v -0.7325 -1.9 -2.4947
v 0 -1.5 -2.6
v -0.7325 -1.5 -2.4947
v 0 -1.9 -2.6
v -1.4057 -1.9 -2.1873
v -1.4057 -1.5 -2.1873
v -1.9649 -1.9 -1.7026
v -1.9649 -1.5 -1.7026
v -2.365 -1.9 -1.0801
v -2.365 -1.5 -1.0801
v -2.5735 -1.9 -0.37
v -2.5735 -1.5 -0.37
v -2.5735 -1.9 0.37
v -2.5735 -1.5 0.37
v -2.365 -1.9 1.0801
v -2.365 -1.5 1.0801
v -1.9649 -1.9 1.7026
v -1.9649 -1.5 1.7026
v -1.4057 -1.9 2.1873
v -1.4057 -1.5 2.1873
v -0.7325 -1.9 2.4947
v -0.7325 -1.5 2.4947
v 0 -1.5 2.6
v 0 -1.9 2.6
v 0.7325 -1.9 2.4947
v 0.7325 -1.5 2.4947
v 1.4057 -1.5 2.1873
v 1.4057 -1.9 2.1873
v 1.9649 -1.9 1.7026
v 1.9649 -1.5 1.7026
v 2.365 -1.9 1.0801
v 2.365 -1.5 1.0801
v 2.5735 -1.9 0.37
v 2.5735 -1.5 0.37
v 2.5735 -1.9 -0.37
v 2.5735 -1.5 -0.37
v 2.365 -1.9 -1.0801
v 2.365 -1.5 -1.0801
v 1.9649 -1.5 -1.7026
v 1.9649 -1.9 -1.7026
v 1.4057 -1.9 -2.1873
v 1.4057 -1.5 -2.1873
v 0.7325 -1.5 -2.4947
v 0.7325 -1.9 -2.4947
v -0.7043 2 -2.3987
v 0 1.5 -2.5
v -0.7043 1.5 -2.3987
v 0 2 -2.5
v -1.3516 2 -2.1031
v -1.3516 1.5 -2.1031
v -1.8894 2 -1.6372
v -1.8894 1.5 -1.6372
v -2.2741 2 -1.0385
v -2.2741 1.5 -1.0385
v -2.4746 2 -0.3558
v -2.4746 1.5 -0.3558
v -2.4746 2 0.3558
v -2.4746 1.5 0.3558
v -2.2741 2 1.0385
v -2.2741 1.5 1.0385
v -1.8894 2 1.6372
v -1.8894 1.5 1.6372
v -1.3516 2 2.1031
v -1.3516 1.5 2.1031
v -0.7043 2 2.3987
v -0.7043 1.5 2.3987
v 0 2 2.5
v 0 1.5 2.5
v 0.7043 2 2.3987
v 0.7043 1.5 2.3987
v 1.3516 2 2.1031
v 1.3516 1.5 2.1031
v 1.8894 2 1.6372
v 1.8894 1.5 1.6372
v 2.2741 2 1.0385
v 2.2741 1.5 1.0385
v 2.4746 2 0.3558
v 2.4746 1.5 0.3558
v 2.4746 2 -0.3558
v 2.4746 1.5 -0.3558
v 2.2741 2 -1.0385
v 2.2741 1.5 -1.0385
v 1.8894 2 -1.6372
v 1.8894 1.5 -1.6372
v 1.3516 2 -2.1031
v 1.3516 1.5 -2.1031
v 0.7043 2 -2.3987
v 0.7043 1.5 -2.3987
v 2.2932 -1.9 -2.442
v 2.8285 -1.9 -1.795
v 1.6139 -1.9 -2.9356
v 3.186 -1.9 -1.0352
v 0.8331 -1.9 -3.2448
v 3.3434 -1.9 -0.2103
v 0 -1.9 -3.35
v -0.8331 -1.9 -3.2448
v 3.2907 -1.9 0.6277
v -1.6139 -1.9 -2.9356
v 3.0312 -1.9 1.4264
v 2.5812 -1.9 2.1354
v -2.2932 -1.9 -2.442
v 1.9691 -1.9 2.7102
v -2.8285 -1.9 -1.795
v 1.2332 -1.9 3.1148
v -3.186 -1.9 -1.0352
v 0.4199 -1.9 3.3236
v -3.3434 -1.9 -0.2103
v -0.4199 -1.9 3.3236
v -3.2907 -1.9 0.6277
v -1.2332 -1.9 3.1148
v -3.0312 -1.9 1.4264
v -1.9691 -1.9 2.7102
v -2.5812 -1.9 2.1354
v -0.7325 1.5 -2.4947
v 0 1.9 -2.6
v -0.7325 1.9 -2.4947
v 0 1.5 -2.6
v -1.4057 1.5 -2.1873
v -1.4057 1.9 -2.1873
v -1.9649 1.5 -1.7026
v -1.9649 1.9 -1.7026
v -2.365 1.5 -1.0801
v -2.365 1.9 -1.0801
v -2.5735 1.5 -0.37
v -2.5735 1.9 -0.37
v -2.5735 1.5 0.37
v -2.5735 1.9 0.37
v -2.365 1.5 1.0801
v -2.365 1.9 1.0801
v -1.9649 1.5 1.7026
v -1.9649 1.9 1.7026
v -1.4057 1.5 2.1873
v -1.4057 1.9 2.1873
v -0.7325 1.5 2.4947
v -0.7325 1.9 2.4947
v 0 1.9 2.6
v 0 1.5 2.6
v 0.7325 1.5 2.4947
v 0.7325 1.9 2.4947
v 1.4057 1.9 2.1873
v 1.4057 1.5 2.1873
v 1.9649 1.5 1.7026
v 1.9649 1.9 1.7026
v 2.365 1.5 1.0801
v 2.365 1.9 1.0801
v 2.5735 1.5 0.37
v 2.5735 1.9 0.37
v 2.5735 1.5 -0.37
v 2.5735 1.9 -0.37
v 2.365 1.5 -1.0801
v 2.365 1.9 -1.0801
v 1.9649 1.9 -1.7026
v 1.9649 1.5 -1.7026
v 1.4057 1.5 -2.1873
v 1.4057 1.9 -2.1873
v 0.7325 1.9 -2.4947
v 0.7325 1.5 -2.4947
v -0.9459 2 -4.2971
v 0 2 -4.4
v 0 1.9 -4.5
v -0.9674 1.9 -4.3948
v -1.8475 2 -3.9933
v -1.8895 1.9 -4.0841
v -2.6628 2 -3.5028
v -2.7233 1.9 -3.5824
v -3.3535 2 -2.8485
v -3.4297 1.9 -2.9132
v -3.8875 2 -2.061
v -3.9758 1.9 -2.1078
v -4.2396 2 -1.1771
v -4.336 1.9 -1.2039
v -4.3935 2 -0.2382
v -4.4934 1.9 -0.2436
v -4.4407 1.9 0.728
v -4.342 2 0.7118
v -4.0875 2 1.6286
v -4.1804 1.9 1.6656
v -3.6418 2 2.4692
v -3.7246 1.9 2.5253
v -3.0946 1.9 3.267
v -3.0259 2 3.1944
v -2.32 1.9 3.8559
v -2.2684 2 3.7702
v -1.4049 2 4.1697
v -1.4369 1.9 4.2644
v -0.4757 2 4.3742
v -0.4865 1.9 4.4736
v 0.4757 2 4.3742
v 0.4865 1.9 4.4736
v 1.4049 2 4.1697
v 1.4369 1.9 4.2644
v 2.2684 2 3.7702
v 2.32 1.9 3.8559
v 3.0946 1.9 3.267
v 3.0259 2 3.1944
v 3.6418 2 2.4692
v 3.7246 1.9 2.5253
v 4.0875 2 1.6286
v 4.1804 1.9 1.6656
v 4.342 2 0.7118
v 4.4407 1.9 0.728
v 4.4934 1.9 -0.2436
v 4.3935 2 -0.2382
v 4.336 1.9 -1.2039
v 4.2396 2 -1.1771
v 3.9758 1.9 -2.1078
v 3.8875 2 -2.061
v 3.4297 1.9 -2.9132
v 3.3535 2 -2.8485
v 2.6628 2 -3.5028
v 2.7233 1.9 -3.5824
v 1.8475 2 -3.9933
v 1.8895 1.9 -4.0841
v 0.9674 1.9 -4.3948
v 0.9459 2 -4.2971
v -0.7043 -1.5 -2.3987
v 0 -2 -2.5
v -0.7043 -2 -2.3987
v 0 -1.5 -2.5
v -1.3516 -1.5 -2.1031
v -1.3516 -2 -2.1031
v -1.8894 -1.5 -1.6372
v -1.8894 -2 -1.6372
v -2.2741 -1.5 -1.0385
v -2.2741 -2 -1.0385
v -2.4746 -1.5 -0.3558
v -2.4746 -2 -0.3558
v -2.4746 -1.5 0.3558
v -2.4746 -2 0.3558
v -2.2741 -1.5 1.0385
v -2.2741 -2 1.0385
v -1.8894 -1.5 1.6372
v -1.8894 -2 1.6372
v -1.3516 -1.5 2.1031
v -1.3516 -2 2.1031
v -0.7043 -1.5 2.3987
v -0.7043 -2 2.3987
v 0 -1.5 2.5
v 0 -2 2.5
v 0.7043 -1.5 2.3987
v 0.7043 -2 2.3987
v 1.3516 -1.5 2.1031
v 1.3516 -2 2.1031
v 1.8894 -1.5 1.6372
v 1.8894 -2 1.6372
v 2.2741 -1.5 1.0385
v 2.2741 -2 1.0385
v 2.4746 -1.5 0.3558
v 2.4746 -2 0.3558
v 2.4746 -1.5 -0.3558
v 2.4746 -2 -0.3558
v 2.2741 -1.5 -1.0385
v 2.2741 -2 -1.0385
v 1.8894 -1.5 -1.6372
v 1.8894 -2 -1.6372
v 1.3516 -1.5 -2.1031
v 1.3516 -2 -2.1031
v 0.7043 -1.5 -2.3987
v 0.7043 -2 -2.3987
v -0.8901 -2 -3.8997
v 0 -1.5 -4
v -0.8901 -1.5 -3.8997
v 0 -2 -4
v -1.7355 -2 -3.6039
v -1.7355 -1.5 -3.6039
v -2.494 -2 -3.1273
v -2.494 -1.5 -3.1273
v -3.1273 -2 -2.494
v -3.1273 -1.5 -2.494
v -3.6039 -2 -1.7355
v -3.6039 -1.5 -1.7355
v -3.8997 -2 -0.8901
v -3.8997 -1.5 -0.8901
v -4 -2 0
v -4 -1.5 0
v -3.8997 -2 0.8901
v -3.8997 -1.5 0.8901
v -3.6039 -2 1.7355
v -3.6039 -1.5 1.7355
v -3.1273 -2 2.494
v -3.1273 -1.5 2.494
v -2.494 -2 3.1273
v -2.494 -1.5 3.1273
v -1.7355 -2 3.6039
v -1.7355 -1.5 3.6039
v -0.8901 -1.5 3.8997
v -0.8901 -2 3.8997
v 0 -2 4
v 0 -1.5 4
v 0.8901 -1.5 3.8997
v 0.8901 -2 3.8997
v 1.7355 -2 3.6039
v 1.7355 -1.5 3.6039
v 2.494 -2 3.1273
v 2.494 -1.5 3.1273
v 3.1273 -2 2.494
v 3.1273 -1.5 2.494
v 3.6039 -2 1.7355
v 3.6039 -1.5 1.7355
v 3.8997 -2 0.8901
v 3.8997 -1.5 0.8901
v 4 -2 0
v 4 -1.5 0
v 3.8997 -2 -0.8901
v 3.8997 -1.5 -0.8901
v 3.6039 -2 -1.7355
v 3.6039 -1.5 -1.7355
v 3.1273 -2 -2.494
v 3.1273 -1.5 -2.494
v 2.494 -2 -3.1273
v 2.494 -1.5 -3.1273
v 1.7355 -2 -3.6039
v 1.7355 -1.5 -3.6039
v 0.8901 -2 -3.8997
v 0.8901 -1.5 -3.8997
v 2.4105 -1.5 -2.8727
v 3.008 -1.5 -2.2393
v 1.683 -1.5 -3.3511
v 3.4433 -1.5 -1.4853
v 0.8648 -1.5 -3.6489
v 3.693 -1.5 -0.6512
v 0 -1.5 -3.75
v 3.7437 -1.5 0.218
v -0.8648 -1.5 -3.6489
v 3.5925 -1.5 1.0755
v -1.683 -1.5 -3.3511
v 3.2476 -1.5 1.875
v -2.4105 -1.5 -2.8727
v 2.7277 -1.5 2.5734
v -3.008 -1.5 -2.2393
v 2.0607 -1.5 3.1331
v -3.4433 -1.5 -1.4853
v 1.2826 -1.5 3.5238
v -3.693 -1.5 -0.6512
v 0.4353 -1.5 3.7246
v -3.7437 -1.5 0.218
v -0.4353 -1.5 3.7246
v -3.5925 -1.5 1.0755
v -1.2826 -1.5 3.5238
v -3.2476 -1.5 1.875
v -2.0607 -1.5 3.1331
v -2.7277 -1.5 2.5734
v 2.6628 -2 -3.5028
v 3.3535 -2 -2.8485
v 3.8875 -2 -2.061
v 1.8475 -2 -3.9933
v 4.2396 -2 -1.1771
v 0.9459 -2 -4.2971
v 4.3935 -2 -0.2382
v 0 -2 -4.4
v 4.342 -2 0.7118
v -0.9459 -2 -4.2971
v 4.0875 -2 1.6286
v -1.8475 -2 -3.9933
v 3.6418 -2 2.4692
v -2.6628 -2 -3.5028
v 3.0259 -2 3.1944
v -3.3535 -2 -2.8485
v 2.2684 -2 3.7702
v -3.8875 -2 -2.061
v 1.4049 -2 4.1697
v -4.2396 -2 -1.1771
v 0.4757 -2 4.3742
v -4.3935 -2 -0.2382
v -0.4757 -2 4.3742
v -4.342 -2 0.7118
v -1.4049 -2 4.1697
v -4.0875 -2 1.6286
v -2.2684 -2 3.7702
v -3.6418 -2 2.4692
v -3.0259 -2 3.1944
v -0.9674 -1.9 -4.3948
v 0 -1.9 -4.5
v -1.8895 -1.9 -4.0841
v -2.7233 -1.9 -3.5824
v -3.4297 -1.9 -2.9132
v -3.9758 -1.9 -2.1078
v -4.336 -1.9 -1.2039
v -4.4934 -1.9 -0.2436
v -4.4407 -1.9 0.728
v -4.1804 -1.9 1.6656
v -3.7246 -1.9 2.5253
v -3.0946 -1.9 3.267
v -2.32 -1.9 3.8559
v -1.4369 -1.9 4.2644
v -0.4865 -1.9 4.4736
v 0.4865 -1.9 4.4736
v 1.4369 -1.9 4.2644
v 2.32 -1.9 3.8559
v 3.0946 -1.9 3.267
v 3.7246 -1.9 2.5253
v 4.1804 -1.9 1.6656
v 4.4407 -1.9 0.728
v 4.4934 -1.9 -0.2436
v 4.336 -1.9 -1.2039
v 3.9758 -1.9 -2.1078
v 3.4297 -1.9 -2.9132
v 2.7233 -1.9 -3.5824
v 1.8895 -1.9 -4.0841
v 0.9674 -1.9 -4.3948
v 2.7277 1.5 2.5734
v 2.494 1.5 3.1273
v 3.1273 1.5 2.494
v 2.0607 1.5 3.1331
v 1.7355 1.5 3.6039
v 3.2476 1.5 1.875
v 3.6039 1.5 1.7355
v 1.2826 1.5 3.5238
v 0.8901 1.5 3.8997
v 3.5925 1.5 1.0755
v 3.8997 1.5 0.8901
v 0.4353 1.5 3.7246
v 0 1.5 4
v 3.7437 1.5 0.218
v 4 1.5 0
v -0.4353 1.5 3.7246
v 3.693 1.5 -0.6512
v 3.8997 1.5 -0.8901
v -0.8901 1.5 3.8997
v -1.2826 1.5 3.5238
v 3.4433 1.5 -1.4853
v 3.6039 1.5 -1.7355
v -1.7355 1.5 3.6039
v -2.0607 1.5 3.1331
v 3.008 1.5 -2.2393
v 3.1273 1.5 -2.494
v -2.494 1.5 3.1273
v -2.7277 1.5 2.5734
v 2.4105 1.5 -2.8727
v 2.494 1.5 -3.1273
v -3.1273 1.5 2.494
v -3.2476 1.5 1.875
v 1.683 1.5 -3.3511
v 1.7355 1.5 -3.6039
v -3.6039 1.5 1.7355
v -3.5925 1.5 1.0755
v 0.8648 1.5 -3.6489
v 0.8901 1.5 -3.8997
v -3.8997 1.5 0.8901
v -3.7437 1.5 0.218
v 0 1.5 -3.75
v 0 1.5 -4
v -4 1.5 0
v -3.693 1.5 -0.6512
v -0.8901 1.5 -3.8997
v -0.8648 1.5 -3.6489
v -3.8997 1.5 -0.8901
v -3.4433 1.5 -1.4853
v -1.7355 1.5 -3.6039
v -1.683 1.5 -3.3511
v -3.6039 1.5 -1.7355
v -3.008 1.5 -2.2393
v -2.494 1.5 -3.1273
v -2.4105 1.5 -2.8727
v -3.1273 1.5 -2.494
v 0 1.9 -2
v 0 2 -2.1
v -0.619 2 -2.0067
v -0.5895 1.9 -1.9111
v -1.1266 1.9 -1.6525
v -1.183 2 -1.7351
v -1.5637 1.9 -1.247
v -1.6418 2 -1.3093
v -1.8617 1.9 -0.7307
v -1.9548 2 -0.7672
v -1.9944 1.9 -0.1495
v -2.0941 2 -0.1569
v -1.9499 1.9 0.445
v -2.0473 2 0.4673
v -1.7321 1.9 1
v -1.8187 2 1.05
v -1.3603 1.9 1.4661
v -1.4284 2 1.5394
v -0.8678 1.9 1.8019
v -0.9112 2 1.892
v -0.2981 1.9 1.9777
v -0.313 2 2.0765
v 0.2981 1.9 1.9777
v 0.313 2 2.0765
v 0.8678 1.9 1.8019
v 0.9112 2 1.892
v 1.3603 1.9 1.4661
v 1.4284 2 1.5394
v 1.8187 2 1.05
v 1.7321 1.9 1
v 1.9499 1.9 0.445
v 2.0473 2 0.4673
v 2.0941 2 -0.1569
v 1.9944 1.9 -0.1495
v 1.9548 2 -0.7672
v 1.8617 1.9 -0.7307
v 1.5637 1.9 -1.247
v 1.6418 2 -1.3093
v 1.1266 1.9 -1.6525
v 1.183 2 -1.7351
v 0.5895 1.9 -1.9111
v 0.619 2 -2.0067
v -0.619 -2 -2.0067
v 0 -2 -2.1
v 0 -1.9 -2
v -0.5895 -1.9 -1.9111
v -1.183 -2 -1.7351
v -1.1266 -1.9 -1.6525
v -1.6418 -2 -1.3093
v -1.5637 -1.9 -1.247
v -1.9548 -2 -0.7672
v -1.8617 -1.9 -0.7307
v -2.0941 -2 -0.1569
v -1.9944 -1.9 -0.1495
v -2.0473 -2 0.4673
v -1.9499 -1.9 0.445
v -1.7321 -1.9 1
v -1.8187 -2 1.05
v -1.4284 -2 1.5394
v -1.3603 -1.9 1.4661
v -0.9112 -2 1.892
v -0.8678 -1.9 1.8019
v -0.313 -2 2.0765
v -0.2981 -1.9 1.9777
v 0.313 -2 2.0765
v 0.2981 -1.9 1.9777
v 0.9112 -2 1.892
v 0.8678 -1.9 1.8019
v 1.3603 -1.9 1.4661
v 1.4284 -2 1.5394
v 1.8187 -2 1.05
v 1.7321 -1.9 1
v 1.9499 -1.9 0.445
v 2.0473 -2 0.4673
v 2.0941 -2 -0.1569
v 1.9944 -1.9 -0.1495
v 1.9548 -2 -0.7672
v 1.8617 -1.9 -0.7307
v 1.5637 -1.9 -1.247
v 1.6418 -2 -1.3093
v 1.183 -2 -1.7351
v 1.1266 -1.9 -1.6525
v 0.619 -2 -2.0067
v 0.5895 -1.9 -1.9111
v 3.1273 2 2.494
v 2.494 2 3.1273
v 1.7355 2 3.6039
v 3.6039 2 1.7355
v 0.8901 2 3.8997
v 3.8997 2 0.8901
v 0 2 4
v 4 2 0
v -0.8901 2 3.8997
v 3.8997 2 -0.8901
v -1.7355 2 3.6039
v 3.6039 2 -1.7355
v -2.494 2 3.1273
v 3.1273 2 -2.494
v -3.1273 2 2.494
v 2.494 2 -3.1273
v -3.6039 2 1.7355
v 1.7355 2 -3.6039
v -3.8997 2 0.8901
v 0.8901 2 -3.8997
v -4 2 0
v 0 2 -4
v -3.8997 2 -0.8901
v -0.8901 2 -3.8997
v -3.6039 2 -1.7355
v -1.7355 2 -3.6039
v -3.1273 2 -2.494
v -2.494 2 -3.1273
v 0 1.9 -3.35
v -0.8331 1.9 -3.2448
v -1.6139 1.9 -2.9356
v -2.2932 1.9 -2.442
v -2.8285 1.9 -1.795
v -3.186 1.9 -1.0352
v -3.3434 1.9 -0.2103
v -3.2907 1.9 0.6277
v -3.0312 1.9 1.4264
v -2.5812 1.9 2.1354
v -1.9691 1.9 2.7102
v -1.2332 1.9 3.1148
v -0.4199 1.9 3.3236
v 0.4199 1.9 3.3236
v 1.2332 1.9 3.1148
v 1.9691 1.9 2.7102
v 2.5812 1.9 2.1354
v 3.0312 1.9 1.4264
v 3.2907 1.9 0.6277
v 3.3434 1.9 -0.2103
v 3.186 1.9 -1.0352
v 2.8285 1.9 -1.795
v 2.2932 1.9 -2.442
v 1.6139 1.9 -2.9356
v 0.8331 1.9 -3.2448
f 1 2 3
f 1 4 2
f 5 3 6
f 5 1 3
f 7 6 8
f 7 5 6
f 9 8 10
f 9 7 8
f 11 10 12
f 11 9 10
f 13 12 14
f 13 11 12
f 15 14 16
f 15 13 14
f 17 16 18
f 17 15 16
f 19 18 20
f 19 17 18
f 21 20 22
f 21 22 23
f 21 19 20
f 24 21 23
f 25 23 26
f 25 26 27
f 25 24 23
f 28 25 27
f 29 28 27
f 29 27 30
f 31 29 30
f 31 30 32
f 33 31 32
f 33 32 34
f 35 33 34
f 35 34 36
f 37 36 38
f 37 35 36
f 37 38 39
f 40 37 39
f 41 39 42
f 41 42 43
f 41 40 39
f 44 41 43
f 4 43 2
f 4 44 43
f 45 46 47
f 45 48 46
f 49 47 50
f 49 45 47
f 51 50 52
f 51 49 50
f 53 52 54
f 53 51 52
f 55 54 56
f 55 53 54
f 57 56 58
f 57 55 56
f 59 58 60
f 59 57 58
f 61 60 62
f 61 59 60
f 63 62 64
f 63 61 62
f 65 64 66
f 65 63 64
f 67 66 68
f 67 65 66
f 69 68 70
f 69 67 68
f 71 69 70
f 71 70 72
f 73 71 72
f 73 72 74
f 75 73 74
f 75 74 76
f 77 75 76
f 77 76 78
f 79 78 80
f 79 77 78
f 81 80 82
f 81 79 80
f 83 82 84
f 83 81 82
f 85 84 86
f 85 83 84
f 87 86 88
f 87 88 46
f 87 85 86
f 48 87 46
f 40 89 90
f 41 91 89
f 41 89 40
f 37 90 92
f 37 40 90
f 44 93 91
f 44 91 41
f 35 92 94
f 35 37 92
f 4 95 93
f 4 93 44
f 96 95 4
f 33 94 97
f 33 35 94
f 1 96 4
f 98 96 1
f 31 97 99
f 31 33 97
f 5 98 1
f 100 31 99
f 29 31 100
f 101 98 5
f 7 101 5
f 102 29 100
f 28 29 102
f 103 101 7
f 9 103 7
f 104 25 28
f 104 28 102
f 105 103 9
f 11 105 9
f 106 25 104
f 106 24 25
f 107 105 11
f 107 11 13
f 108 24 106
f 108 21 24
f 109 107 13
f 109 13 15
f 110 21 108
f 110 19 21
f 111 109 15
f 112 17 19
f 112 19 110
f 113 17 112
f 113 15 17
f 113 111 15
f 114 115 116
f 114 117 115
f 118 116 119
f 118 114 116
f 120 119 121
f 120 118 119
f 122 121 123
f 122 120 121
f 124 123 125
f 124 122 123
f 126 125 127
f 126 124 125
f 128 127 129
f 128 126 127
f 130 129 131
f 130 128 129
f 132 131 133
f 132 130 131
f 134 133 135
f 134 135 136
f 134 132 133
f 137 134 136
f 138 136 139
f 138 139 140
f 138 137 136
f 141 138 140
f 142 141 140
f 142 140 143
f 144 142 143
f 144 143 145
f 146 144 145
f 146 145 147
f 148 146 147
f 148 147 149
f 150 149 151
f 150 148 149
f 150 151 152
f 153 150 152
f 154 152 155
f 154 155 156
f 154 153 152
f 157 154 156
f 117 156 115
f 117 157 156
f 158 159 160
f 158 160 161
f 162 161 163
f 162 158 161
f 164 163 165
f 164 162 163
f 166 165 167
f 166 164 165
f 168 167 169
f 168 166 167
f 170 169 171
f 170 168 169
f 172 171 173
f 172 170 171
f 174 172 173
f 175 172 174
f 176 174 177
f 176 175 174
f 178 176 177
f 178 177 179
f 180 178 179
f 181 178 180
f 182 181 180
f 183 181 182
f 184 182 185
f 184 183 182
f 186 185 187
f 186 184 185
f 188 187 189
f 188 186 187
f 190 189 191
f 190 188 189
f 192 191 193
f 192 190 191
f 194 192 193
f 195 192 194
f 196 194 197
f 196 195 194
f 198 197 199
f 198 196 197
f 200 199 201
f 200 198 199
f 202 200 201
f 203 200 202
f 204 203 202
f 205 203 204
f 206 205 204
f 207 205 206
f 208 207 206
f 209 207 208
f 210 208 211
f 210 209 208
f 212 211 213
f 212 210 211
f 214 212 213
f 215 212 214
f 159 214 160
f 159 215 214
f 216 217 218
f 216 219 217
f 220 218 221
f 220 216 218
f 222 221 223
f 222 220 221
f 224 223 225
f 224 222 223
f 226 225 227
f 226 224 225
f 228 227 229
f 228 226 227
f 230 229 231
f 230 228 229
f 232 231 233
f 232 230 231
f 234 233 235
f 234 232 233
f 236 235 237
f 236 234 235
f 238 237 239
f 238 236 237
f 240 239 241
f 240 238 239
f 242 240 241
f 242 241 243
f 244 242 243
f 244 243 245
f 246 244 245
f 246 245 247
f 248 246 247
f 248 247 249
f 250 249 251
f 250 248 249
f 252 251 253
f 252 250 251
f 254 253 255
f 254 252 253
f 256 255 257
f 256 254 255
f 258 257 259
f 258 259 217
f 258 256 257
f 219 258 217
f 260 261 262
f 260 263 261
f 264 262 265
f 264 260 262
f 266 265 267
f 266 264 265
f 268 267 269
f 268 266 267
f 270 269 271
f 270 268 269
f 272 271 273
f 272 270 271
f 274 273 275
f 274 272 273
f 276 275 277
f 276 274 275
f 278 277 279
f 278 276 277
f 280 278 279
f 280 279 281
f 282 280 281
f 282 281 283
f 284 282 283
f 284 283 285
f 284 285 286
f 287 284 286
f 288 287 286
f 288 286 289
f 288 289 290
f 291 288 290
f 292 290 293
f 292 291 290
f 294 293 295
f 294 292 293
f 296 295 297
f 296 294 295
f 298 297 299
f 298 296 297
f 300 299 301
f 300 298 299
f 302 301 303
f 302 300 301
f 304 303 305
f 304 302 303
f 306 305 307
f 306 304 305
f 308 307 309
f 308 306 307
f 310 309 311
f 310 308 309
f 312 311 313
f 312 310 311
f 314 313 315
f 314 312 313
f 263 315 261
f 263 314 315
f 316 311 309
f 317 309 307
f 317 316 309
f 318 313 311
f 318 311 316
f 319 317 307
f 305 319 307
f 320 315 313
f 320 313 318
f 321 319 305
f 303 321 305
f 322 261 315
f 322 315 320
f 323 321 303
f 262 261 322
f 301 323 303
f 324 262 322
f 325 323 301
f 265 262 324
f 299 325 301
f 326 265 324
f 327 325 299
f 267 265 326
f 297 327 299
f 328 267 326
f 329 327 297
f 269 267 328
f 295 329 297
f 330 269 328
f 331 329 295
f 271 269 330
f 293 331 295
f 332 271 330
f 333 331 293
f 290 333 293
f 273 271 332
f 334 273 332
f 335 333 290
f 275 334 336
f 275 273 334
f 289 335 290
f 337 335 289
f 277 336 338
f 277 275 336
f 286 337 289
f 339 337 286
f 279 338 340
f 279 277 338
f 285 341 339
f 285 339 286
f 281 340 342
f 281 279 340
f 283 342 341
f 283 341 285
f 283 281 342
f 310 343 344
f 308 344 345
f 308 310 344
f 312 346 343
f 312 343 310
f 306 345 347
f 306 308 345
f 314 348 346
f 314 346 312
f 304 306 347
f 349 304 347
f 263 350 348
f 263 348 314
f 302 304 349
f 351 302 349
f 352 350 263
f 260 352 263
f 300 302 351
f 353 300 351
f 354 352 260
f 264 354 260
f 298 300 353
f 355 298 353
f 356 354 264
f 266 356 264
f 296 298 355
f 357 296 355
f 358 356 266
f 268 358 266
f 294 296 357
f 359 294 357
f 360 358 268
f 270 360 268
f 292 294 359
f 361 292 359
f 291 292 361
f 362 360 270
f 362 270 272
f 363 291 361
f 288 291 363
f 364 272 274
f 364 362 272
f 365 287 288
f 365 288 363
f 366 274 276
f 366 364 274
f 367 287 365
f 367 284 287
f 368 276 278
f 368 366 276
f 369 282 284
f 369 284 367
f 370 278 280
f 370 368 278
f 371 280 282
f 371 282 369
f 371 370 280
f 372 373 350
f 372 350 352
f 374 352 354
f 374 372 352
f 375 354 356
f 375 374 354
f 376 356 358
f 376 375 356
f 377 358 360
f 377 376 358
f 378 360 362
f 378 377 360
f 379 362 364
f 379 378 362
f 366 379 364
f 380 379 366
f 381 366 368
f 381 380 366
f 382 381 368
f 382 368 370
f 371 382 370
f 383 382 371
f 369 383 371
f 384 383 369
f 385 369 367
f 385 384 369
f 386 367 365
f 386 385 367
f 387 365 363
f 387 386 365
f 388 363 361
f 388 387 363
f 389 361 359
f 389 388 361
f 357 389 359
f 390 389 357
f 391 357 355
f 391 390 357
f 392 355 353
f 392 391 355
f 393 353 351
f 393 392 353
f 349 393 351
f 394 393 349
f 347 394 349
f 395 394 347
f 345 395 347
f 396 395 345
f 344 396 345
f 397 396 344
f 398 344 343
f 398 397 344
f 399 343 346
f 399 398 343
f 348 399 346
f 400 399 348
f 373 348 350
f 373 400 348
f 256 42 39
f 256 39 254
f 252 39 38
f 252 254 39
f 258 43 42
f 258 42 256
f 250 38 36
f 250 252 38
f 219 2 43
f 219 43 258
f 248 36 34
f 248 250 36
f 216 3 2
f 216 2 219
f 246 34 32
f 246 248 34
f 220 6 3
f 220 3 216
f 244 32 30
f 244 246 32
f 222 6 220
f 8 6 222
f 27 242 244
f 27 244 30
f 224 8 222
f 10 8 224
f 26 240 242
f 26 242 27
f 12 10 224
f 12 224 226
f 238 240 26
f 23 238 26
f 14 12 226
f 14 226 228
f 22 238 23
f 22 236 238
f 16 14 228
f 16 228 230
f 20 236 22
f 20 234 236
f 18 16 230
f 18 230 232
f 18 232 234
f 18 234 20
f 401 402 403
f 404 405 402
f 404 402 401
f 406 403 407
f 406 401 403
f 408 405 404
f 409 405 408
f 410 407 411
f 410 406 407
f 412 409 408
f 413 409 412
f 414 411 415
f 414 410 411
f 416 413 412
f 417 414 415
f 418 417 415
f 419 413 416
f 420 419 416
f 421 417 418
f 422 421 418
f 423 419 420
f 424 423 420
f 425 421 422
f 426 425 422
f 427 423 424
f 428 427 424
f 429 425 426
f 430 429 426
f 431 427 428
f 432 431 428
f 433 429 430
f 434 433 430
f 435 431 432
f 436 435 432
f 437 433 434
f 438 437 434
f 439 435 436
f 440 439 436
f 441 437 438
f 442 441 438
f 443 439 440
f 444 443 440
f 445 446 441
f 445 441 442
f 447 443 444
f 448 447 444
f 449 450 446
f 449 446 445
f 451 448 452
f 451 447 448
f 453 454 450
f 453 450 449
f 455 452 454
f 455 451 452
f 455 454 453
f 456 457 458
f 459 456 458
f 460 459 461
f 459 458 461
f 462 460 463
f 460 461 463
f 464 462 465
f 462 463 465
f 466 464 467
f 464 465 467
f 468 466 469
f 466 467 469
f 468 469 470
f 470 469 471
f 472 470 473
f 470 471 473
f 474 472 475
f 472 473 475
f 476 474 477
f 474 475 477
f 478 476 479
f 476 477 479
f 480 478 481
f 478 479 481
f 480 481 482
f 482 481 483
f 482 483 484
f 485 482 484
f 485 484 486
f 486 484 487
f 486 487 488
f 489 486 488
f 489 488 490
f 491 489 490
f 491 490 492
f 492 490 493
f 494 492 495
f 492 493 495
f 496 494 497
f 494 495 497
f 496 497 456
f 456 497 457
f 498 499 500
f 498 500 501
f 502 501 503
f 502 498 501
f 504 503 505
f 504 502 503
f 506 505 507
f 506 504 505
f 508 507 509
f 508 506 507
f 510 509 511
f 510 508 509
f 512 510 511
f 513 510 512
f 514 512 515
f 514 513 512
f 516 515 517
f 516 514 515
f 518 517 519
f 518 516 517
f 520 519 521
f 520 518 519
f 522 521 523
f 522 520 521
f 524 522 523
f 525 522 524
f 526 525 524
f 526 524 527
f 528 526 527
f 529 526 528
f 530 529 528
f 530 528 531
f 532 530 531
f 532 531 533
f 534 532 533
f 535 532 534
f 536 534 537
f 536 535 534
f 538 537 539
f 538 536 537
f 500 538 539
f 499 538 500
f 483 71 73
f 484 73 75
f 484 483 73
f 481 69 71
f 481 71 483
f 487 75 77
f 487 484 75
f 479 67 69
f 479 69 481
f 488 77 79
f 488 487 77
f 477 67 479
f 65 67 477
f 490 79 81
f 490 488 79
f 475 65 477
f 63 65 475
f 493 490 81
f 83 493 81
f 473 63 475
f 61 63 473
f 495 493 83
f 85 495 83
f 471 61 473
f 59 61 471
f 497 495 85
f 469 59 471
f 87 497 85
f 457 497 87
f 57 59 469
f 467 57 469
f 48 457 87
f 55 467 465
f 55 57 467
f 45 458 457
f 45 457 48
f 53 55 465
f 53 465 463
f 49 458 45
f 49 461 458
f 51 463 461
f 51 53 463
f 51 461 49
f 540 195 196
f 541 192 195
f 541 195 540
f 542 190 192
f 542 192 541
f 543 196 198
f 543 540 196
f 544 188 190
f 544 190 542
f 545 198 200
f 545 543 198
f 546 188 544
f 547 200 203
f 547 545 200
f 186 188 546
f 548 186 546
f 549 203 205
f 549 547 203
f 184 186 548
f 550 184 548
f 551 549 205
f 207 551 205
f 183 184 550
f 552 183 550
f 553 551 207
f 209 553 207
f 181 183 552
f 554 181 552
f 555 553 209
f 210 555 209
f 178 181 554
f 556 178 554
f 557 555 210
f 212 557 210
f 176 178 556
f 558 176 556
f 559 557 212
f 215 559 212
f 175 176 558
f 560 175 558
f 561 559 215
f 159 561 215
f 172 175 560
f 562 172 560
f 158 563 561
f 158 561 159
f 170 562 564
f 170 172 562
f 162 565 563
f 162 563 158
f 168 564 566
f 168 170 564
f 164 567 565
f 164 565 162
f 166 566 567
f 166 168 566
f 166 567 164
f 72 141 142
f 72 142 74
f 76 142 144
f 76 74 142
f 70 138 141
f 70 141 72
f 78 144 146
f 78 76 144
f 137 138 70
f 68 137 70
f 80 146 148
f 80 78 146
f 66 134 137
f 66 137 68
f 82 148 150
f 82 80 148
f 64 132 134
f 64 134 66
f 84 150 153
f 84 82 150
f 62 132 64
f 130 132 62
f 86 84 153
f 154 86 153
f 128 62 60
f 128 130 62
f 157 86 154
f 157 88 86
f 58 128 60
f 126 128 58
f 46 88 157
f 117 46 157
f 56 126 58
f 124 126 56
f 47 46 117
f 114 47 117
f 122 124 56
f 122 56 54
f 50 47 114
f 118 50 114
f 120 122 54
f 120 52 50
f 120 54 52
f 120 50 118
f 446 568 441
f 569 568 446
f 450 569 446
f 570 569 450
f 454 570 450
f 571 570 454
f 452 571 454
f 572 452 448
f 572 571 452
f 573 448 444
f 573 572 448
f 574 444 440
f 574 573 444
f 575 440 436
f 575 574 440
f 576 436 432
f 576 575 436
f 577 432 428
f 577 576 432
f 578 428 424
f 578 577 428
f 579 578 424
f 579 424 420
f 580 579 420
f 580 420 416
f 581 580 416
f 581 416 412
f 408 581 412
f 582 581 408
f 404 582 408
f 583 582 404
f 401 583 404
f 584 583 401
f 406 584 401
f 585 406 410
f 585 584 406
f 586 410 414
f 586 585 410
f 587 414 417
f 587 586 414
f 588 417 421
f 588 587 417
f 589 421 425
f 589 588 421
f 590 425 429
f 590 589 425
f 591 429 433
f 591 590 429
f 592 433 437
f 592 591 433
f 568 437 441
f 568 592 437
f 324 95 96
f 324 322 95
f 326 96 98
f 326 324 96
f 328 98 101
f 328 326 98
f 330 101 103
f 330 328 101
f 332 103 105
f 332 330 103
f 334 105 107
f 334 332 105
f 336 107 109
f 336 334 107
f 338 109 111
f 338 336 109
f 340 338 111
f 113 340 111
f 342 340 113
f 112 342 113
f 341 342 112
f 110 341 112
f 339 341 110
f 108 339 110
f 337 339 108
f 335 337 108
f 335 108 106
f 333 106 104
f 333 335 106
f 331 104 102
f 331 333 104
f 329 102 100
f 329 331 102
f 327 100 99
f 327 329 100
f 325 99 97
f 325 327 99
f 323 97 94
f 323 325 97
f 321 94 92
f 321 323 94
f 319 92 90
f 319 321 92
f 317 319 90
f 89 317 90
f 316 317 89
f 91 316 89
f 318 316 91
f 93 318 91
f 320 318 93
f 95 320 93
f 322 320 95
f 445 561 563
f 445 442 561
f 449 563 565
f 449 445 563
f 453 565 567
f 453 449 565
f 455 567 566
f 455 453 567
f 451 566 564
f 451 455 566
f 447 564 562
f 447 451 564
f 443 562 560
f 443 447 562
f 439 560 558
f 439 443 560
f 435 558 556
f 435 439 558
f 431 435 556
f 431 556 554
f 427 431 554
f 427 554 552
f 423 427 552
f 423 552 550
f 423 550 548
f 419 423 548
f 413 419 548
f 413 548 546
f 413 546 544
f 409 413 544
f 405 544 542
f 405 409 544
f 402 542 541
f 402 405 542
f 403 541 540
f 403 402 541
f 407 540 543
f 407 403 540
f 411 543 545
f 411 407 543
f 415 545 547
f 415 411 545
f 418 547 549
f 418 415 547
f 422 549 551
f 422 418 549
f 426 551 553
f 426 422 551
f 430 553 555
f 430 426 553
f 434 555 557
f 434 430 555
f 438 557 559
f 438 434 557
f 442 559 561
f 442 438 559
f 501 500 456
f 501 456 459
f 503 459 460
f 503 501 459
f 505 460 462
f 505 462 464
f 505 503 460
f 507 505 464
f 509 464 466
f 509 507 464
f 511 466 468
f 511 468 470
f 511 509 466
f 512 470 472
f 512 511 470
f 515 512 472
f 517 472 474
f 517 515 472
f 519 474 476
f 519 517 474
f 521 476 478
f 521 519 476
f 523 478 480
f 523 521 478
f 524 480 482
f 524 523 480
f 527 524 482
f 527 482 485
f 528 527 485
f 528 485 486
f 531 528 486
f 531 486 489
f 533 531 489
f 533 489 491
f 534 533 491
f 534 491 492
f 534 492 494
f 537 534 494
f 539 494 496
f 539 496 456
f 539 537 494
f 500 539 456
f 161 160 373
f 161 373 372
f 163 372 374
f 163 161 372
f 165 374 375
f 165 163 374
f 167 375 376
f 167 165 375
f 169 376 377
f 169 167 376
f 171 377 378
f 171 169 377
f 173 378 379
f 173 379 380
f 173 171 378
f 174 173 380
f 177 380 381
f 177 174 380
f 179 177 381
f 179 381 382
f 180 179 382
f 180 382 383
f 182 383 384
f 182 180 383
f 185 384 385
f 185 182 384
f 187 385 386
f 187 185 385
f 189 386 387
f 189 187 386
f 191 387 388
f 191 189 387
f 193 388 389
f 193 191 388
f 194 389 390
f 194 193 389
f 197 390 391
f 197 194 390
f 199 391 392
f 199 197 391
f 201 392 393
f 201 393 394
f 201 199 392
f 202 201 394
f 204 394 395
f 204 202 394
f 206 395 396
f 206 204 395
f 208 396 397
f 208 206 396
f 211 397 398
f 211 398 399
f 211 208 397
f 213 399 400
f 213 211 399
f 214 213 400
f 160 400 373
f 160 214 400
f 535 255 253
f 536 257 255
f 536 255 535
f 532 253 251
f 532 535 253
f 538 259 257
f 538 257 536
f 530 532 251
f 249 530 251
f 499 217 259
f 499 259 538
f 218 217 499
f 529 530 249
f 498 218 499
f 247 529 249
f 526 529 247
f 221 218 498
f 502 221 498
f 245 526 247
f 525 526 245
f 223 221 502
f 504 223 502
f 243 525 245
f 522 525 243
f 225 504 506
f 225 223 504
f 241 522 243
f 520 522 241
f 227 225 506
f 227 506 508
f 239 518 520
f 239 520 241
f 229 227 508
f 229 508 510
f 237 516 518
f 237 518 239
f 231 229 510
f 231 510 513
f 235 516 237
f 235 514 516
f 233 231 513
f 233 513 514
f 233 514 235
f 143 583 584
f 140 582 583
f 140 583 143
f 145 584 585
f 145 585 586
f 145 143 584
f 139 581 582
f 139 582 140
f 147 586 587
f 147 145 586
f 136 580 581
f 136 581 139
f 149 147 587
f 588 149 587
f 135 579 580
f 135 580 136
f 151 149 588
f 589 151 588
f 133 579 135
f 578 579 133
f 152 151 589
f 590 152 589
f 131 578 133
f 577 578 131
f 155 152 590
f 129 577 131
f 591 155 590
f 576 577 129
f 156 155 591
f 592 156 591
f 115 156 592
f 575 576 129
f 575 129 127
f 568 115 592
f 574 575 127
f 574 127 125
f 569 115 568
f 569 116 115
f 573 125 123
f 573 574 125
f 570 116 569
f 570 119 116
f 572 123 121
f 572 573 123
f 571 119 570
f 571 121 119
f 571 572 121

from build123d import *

# Parameters (mm, degrees)
CHAMFER1_SIZE = 0.1


with BuildPart() as part:
    # Sketch1 → Revolve1 (revolve)
    with BuildSketch(Plane(origin=(0, 0, 0), x_dir=(0, 0, -1), z_dir=(1, 0, 0)), mode=Mode.PRIVATE) as revolve1_sk:
        Polygon((-2, 2), (-2, -2), (-2.5, -2), (-2.5, -1.5), (-2.6, -1.5), (-2.6, -1.9), (-3.35, -1.9), (-3.75, -1.5), (-4, -1.5), (-4, -2), (-4.5, -2), (-4.5, 2), (-4, 2), (-4, 1.5), (-3.75, 1.5), (-3.35, 1.9), (-2.6, 1.9), (-2.6, 1.5), (-2.5, 1.5), (-2.5, 2), align=None)
    revolve(revolve1_sk.sketch.rotate(Axis((0, -2, 0), (0, 1, 0)), 180), axis=Axis((0, -2, 0), (0, 1, 0)))

    # Chamfer1
    chamfer1_edges = [part.edges().sort_by_distance(p)[0] for p in [
        (0, 2, 4.5),
        (0, -2, 4.5),
        (0, -2, 2),
        (0, 2, 2),
    ]]
    chamfer(chamfer1_edges, length=CHAMFER1_SIZE)


solid = part.part
